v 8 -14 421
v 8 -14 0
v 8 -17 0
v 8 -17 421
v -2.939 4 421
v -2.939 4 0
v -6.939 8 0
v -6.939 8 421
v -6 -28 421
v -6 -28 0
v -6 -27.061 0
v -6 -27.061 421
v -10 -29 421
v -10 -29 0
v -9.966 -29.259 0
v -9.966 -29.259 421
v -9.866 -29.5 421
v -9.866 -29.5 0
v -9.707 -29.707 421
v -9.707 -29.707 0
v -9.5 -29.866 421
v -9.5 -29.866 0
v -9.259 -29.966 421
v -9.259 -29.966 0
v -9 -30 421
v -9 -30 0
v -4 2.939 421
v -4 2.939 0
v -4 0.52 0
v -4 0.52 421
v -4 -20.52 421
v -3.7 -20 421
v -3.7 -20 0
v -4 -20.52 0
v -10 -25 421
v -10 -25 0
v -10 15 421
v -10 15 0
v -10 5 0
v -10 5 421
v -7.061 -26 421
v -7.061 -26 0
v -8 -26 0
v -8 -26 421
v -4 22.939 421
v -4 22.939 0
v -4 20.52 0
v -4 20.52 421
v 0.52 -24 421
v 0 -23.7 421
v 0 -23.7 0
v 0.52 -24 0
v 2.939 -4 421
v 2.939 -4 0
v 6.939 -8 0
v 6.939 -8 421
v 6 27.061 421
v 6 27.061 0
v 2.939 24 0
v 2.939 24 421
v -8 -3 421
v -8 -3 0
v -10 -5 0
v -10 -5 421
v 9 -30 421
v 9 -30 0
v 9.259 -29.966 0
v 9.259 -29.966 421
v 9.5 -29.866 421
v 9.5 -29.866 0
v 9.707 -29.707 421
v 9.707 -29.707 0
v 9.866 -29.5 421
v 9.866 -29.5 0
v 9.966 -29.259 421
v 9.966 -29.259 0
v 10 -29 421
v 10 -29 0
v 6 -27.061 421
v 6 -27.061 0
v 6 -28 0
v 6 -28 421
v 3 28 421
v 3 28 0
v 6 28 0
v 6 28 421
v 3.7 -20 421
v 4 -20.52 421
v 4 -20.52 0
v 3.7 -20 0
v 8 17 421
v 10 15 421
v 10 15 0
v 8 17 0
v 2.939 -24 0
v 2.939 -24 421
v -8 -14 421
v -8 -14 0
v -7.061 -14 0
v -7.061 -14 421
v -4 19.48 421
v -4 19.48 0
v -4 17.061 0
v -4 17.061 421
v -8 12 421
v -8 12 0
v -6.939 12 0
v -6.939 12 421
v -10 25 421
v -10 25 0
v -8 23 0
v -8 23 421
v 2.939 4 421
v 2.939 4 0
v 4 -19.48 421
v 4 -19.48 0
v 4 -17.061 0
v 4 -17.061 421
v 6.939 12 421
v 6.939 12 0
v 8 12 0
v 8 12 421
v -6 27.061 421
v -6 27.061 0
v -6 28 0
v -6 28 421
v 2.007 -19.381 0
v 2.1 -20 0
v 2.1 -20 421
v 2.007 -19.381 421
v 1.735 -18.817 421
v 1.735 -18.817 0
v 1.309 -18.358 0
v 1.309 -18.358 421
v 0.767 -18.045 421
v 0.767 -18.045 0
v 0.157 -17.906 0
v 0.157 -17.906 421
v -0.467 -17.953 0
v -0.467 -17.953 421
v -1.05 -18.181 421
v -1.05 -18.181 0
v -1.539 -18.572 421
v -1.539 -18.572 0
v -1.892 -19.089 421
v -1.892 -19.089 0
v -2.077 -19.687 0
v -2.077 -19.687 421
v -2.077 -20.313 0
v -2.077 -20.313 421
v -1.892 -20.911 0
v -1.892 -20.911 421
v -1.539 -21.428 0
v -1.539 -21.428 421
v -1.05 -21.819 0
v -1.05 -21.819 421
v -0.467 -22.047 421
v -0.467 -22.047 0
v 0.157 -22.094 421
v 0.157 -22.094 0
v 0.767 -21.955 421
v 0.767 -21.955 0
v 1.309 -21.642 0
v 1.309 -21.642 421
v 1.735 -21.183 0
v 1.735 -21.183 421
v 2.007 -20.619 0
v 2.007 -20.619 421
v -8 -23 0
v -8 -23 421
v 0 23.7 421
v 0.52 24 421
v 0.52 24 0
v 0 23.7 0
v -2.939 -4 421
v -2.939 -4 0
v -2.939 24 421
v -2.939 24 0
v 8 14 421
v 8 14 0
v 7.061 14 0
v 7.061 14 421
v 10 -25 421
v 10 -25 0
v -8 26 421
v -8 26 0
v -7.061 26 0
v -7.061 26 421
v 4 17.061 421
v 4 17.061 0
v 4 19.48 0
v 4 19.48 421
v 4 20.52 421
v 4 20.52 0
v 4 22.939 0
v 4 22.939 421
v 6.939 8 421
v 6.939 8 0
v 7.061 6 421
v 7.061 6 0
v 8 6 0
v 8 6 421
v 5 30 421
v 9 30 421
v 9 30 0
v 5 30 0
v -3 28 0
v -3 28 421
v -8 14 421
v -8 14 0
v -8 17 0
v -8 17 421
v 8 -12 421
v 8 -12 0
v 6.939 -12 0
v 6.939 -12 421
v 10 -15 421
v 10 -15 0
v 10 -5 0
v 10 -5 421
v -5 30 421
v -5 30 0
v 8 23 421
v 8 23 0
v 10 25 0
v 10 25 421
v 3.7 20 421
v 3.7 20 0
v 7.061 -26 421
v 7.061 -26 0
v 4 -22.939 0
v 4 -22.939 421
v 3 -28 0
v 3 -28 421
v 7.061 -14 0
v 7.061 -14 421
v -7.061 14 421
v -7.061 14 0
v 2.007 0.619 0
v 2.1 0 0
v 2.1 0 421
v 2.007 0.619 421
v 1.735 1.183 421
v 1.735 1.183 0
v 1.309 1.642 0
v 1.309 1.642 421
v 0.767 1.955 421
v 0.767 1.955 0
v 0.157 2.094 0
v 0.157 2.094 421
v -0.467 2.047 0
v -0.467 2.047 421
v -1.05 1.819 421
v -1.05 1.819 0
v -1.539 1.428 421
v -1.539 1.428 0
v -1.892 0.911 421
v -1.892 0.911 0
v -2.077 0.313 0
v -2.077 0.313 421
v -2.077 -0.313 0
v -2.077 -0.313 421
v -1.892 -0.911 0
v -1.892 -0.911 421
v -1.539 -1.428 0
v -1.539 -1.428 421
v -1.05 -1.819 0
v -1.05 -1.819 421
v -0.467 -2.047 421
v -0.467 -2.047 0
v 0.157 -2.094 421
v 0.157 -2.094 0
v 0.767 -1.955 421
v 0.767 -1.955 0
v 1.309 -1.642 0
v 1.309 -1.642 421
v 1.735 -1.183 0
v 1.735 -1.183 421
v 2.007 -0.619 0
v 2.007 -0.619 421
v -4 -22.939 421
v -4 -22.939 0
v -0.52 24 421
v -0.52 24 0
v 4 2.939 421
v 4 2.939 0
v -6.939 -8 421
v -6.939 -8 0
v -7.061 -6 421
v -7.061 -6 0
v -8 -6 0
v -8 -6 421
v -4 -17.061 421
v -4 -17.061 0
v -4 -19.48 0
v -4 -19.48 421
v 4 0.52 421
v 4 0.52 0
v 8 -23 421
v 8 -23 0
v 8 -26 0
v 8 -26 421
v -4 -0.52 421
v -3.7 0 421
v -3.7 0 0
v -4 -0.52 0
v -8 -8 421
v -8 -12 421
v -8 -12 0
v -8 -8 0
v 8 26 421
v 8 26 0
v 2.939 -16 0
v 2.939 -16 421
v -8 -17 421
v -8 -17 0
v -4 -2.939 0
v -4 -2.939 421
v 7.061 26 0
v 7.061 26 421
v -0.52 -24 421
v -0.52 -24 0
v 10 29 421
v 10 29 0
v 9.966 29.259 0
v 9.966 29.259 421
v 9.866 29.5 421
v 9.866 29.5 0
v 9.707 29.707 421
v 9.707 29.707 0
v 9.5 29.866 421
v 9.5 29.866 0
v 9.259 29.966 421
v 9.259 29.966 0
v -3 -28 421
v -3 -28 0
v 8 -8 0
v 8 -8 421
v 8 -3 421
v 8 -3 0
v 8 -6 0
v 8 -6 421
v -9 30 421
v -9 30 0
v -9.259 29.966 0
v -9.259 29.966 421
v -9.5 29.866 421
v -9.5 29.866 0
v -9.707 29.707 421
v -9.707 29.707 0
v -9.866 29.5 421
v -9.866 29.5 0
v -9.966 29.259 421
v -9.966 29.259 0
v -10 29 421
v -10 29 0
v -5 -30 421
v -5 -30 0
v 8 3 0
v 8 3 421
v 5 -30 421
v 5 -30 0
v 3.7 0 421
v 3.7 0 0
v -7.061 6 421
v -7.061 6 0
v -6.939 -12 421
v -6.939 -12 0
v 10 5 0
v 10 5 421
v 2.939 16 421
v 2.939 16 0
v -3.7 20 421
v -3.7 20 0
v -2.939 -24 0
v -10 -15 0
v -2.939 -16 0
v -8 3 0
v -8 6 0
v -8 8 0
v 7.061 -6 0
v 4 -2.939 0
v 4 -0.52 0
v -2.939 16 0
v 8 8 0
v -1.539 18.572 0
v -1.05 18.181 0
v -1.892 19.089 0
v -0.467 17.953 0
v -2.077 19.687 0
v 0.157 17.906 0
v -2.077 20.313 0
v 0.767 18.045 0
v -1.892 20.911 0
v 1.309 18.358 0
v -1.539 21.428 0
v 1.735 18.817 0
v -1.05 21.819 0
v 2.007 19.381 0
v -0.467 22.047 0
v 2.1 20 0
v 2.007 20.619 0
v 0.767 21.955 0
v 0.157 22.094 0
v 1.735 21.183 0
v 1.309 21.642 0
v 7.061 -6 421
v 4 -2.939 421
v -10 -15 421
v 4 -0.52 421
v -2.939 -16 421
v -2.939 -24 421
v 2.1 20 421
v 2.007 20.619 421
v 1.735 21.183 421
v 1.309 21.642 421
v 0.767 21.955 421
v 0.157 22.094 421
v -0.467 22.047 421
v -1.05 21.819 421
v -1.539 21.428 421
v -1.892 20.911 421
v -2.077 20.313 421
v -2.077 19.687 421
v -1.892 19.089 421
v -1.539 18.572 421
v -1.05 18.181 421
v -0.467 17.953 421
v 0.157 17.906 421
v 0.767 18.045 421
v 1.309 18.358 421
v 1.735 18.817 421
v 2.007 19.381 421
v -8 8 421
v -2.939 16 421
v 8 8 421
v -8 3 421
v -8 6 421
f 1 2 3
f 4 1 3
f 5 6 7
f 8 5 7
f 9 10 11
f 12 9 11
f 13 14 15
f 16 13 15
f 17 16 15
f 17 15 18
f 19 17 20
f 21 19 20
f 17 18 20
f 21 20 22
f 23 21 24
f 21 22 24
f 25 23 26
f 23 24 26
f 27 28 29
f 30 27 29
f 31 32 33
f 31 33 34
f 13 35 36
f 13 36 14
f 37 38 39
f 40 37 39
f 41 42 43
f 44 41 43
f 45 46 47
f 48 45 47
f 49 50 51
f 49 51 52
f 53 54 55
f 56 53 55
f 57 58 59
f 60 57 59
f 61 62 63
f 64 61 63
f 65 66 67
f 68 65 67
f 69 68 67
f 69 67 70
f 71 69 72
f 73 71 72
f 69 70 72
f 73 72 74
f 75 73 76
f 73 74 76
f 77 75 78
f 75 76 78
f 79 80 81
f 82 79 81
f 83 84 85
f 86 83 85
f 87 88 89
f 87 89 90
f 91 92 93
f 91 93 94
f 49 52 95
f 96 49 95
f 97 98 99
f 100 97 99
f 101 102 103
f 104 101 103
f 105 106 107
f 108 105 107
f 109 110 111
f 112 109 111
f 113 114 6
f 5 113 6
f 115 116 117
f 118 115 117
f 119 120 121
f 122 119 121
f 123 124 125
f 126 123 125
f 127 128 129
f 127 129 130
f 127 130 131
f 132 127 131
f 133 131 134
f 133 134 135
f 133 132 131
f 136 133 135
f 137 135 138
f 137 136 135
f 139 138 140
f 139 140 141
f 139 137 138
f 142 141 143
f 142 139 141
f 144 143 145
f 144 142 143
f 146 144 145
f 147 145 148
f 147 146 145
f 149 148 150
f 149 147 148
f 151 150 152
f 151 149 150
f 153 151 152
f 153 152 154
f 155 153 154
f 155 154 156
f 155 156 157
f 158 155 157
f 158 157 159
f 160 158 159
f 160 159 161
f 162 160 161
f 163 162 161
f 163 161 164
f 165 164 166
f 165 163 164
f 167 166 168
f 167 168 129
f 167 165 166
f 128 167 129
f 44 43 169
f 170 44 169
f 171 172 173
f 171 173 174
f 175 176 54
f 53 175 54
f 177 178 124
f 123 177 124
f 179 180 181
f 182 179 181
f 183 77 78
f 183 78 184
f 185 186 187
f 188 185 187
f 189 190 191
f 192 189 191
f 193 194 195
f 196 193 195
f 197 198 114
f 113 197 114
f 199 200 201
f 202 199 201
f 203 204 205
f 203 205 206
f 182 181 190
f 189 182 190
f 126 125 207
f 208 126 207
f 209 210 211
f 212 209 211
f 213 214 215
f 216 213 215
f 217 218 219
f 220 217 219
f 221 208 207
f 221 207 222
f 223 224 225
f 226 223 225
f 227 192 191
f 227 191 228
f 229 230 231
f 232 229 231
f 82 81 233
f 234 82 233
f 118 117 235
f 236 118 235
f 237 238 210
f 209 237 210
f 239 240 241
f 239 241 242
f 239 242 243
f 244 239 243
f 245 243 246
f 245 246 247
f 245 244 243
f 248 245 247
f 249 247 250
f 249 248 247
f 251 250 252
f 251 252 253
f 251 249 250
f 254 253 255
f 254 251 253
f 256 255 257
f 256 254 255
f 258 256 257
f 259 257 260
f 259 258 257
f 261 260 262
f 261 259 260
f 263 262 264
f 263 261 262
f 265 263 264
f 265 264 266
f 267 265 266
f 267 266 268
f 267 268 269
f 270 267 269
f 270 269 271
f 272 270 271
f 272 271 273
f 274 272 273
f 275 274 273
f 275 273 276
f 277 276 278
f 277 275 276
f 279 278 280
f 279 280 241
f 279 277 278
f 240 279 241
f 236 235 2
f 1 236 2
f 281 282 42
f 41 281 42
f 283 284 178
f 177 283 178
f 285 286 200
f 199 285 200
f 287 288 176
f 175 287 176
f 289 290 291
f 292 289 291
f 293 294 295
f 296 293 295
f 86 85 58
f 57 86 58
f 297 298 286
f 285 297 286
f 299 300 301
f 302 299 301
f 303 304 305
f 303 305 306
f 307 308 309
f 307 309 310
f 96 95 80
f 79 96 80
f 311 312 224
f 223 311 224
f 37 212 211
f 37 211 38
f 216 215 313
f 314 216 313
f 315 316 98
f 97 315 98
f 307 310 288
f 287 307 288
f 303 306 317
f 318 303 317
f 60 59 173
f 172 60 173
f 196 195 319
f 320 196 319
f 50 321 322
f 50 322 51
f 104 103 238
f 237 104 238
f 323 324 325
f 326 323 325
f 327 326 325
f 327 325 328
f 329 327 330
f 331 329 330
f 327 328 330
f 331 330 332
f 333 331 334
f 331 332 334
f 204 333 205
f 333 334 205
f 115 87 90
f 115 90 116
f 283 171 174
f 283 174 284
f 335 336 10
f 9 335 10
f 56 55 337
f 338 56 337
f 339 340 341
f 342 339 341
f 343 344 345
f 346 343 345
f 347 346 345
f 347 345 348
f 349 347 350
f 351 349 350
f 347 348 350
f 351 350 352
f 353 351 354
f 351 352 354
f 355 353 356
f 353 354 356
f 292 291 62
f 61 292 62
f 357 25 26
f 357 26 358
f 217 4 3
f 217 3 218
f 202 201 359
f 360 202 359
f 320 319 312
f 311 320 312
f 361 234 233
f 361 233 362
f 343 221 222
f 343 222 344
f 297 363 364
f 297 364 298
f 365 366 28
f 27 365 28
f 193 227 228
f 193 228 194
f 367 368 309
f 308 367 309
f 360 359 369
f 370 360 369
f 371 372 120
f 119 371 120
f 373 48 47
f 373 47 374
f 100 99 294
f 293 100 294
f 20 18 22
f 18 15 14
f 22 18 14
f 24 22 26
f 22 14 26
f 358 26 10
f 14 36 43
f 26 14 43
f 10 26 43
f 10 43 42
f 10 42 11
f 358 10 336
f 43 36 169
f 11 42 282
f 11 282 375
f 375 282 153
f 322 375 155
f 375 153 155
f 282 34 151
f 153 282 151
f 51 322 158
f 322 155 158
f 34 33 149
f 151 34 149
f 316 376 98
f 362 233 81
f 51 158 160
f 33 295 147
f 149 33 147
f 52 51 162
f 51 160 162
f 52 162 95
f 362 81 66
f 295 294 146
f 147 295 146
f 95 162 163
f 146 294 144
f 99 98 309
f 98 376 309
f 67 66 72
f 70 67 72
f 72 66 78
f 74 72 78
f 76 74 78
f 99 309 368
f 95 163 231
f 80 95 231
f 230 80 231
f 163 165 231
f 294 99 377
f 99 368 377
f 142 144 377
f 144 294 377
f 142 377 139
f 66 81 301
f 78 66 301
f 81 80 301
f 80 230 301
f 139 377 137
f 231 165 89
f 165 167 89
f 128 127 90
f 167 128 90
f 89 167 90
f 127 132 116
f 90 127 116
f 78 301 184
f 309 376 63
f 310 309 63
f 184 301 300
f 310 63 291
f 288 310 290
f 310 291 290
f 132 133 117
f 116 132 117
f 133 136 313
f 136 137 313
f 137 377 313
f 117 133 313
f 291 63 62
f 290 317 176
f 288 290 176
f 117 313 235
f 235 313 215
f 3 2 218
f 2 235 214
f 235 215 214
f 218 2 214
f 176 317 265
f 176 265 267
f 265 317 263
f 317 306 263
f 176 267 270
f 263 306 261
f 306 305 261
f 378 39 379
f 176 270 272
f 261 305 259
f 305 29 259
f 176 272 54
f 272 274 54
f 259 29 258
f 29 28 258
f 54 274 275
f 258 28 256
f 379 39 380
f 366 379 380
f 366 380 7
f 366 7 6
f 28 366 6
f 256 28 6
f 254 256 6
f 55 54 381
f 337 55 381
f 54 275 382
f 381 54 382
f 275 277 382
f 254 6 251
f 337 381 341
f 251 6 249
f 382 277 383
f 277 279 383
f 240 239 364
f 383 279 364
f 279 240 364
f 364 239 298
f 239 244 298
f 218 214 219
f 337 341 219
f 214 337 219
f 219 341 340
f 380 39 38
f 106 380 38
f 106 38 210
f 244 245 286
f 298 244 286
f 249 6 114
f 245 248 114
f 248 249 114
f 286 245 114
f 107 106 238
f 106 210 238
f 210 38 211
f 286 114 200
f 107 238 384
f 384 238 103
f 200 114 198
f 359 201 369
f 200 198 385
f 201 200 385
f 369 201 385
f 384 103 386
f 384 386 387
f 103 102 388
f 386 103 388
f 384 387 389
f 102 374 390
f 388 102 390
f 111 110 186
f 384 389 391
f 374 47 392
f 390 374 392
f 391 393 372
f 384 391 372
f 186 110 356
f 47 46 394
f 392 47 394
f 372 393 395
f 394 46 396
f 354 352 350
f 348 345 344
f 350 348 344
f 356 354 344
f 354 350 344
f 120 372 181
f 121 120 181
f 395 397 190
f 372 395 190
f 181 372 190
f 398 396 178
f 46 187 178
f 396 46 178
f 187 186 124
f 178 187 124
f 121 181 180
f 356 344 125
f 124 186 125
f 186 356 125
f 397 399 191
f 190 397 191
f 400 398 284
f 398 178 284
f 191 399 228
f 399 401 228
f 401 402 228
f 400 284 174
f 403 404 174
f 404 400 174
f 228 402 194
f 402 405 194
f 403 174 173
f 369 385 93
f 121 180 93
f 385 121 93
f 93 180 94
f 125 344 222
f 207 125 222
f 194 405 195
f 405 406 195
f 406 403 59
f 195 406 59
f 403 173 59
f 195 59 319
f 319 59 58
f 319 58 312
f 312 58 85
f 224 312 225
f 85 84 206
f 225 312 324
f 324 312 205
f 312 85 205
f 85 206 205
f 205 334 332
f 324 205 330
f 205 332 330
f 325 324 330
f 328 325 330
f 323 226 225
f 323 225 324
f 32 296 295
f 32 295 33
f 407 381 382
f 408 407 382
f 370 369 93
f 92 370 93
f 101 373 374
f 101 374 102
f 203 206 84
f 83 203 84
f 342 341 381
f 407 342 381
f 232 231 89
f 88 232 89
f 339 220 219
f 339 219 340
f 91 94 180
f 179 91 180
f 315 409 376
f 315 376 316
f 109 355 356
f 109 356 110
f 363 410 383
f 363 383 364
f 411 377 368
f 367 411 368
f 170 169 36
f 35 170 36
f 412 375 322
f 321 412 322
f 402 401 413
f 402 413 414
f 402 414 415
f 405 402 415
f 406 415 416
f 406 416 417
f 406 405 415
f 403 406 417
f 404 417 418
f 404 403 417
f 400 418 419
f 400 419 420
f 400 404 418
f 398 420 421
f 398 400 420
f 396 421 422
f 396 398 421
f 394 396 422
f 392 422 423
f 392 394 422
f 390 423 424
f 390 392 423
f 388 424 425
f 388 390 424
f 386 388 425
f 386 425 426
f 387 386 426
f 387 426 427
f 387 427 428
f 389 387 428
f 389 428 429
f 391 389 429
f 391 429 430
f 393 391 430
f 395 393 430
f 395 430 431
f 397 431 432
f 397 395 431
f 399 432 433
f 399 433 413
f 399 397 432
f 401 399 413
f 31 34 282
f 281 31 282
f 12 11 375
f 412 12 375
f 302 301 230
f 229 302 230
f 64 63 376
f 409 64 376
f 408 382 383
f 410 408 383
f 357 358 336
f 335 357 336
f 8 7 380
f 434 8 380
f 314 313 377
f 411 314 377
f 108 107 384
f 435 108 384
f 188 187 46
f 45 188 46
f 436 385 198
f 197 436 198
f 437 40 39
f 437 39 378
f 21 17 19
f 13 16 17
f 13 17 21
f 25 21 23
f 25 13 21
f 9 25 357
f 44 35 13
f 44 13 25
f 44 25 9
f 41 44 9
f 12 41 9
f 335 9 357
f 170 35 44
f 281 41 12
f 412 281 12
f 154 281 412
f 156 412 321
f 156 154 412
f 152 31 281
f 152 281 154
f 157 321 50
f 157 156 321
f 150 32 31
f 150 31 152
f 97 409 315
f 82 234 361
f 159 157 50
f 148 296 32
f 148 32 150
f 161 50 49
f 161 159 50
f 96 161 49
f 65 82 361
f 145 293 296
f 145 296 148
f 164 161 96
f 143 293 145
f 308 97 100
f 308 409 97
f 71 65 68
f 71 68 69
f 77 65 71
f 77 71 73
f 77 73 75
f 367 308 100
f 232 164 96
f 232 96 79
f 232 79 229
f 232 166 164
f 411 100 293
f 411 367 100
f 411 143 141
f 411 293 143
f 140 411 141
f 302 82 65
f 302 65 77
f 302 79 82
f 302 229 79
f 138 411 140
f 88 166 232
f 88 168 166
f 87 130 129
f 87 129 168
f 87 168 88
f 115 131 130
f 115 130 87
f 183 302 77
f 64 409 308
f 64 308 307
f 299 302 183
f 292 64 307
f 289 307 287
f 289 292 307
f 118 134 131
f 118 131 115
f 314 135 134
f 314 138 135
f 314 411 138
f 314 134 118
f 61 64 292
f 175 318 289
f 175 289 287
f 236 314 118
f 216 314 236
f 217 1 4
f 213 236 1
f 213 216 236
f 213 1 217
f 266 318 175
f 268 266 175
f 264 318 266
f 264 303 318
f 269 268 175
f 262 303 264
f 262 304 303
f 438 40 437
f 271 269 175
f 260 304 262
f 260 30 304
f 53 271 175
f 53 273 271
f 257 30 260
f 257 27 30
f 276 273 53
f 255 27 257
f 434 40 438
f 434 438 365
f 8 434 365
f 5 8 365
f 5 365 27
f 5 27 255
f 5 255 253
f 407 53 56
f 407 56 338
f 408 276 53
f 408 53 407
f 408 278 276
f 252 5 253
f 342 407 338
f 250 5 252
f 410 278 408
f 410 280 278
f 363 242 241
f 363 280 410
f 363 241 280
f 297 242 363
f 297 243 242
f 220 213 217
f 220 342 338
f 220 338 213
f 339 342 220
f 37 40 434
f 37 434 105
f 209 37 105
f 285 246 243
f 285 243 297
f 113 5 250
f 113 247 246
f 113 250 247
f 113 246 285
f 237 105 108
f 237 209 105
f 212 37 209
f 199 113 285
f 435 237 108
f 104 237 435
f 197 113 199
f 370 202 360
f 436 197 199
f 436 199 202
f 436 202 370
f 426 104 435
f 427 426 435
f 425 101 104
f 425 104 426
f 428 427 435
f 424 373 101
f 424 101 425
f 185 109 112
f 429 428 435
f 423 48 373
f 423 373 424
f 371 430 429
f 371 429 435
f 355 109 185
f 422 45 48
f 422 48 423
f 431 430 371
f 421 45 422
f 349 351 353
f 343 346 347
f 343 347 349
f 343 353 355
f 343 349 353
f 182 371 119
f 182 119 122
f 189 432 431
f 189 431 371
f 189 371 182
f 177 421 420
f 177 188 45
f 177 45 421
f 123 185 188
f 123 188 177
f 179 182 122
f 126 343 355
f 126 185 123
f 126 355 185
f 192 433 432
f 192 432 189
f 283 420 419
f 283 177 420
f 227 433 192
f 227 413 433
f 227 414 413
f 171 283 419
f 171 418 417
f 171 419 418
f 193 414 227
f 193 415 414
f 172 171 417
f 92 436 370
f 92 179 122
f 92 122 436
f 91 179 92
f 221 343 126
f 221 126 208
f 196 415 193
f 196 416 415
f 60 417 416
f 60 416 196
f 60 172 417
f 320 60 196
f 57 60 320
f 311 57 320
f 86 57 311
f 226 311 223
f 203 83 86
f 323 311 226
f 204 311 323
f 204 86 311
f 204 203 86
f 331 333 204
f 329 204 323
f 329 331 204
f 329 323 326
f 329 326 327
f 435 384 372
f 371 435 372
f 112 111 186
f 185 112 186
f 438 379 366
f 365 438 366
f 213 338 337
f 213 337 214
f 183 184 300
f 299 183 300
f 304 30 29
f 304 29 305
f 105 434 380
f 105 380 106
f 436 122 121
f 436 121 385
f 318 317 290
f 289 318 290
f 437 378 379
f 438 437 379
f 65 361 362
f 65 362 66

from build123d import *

# Parameters (mm, degrees)
F0_R     = 2.1
F1_DEPTH = 421


with BuildPart() as f1:
    # F0 (on Top) → F1 (new body)
    with BuildSketch(Plane.XY):
        with BuildLine():
            Line((-8, -3), (-10, -5))
            Line((-10, -5), (-10, -15))
            Line((-10, -15), (-8, -17))
            Line((-8, -17), (-8, -14))
            Line((-8, -14), (-7.06066, -14))
            Line((-7.06066, -14), (-4, -17.06066))
            Line((-4, -17.06066), (-4, -19.480385))
            Line((-4, -19.480385), (-3.7, -20))
            Line((-3.7, -20), (-4, -20.519615))
            Line((-4, -20.519615), (-4, -22.93934))
            Line((-4, -22.93934), (-7.06066, -26))
            Line((-7.06066, -26), (-8, -26))
            Line((-8, -26), (-8, -23))
            Line((-8, -23), (-10, -25))
            Line((-10, -25), (-10, -29))
            ThreePointArc((-10, -29), (-9.707107, -29.707107), (-9, -30))
            Line((-9, -30), (-5, -30))
            Line((-5, -30), (-3, -28))
            Line((-3, -28), (-6, -28))
            Line((-6, -28), (-6, -27.06066))
            Line((-6, -27.06066), (-2.93934, -24))
            Line((-2.93934, -24), (-0.519615, -24))
            Line((-0.519615, -24), (0, -23.7))
            Line((0, -23.7), (0.519615, -24))
            Line((0.519615, -24), (2.93934, -24))
            Line((2.93934, -24), (6, -27.06066))
            Line((6, -27.06066), (6, -28))
            Line((6, -28), (3, -28))
            Line((3, -28), (5, -30))
            Line((5, -30), (9, -30))
            ThreePointArc((9, -30), (9.707107, -29.707107), (10, -29))
            Line((10, -29), (10, -25))
            Line((10, -25), (8, -23))
            Line((8, -23), (8, -26))
            Line((8, -26), (7.06066, -26))
            Line((7.06066, -26), (4, -22.93934))
            Line((4, -22.93934), (4, -20.519615))
            Line((4, -20.519615), (3.7, -20))
            Line((3.7, -20), (4, -19.480385))
            Line((4, -19.480385), (4, -17.06066))
            Line((4, -17.06066), (7.06066, -14))
            Line((7.06066, -14), (8, -14))
            Line((8, -14), (8, -17))
            Line((8, -17), (10, -15))
            Line((10, -15), (10, -5))
            Line((10, -5), (8, -3))
            Line((8, -3), (8, -6))
            Line((8, -6), (7.06066, -6))
            Line((7.06066, -6), (4, -2.93934))
            Line((4, -2.93934), (4, -0.519615))
            Line((4, -0.519615), (3.7, 0))
            Line((3.7, 0), (4, 0.519615))
            Line((4, 0.519615), (4, 2.93934))
            Line((4, 2.93934), (7.06066, 6))
            Line((7.06066, 6), (8, 6))
            Line((8, 6), (8, 3))
            Line((8, 3), (10, 5))
            Line((10, 5), (10, 15))
            Line((10, 15), (8, 17))
            Line((8, 17), (8, 14))
            Line((8, 14), (7.06066, 14))
            Line((7.06066, 14), (4, 17.06066))
            Line((4, 17.06066), (4, 19.480385))
            Line((4, 19.480385), (3.7, 20))
            Line((3.7, 20), (4, 20.519615))
            Line((4, 20.519615), (4, 22.93934))
            Line((4, 22.93934), (7.06066, 26))
            Line((7.06066, 26), (8, 26))
            Line((8, 26), (8, 23))
            Line((8, 23), (10, 25))
            Line((10, 25), (10, 29))
            ThreePointArc((10, 29), (9.707107, 29.707107), (9, 30))
            Line((9, 30), (5, 30))
            Line((5, 30), (3, 28))
            Line((3, 28), (6, 28))
            Line((6, 28), (6, 27.06066))
            Line((6, 27.06066), (2.93934, 24))
            Line((2.93934, 24), (0.519615, 24))
            Line((0.519615, 24), (0, 23.7))
            Line((0, 23.7), (-0.519615, 24))
            Line((-0.519615, 24), (-2.93934, 24))
            Line((-2.93934, 24), (-6, 27.06066))
            Line((-6, 27.06066), (-6, 28))
            Line((-6, 28), (-3, 28))
            Line((-3, 28), (-5, 30))
            Line((-5, 30), (-9, 30))
            ThreePointArc((-9, 30), (-9.707107, 29.707107), (-10, 29))
            Line((-10, 29), (-10, 25))
            Line((-10, 25), (-8, 23))
            Line((-8, 23), (-8, 26))
            Line((-8, 26), (-7.06066, 26))
            Line((-7.06066, 26), (-4, 22.93934))
            Line((-4, 22.93934), (-4, 20.519615))
            Line((-4, 20.519615), (-3.7, 20))
            Line((-3.7, 20), (-4, 19.480385))
            Line((-4, 19.480385), (-4, 17.06066))
            Line((-4, 17.06066), (-7.06066, 14))
            Line((-7.06066, 14), (-8, 14))
            Line((-8, 14), (-8, 17))
            Line((-8, 17), (-10, 15))
            Line((-10, 15), (-10, 5))
            Line((-10, 5), (-8, 3))
            Line((-8, 3), (-8, 6))
            Line((-8, 6), (-7.06066, 6))
            Line((-7.06066, 6), (-4, 2.93934))
            Line((-4, 2.93934), (-4, 0.519615))
            Line((-4, 0.519615), (-3.7, 0))
            Line((-3.7, 0), (-4, -0.519615))
            Line((-4, -0.519615), (-4, -2.93934))
            Line((-4, -2.93934), (-7.06066, -6))
            Line((-7.06066, -6), (-8, -6))
            Line((-8, -6), (-8, -3))
        make_face()
        with Locations((0, -20)):
            Circle(F0_R, mode=Mode.SUBTRACT)
        Polygon((-8, -8), (-6.93934, -8), (-2.93934, -4), (2.93934, -4), (6.93934, -8), (8, -8), (8, -12), (6.93934, -12), (2.93934, -16), (-2.93934, -16), (-6.93934, -12), (-8, -12), align=None, mode=Mode.SUBTRACT)
        Circle(F0_R, mode=Mode.SUBTRACT)
        Polygon((-8, 8), (-8, 12), (-6.93934, 12), (-2.93934, 16), (2.93934, 16), (6.93934, 12), (8, 12), (8, 8), (6.93934, 8), (2.93934, 4), (-2.93934, 4), (-6.93934, 8), align=None, mode=Mode.SUBTRACT)
        with Locations((0, 20)):
            Circle(F0_R, mode=Mode.SUBTRACT)
    extrude(amount=F1_DEPTH)


solid = f1.part
